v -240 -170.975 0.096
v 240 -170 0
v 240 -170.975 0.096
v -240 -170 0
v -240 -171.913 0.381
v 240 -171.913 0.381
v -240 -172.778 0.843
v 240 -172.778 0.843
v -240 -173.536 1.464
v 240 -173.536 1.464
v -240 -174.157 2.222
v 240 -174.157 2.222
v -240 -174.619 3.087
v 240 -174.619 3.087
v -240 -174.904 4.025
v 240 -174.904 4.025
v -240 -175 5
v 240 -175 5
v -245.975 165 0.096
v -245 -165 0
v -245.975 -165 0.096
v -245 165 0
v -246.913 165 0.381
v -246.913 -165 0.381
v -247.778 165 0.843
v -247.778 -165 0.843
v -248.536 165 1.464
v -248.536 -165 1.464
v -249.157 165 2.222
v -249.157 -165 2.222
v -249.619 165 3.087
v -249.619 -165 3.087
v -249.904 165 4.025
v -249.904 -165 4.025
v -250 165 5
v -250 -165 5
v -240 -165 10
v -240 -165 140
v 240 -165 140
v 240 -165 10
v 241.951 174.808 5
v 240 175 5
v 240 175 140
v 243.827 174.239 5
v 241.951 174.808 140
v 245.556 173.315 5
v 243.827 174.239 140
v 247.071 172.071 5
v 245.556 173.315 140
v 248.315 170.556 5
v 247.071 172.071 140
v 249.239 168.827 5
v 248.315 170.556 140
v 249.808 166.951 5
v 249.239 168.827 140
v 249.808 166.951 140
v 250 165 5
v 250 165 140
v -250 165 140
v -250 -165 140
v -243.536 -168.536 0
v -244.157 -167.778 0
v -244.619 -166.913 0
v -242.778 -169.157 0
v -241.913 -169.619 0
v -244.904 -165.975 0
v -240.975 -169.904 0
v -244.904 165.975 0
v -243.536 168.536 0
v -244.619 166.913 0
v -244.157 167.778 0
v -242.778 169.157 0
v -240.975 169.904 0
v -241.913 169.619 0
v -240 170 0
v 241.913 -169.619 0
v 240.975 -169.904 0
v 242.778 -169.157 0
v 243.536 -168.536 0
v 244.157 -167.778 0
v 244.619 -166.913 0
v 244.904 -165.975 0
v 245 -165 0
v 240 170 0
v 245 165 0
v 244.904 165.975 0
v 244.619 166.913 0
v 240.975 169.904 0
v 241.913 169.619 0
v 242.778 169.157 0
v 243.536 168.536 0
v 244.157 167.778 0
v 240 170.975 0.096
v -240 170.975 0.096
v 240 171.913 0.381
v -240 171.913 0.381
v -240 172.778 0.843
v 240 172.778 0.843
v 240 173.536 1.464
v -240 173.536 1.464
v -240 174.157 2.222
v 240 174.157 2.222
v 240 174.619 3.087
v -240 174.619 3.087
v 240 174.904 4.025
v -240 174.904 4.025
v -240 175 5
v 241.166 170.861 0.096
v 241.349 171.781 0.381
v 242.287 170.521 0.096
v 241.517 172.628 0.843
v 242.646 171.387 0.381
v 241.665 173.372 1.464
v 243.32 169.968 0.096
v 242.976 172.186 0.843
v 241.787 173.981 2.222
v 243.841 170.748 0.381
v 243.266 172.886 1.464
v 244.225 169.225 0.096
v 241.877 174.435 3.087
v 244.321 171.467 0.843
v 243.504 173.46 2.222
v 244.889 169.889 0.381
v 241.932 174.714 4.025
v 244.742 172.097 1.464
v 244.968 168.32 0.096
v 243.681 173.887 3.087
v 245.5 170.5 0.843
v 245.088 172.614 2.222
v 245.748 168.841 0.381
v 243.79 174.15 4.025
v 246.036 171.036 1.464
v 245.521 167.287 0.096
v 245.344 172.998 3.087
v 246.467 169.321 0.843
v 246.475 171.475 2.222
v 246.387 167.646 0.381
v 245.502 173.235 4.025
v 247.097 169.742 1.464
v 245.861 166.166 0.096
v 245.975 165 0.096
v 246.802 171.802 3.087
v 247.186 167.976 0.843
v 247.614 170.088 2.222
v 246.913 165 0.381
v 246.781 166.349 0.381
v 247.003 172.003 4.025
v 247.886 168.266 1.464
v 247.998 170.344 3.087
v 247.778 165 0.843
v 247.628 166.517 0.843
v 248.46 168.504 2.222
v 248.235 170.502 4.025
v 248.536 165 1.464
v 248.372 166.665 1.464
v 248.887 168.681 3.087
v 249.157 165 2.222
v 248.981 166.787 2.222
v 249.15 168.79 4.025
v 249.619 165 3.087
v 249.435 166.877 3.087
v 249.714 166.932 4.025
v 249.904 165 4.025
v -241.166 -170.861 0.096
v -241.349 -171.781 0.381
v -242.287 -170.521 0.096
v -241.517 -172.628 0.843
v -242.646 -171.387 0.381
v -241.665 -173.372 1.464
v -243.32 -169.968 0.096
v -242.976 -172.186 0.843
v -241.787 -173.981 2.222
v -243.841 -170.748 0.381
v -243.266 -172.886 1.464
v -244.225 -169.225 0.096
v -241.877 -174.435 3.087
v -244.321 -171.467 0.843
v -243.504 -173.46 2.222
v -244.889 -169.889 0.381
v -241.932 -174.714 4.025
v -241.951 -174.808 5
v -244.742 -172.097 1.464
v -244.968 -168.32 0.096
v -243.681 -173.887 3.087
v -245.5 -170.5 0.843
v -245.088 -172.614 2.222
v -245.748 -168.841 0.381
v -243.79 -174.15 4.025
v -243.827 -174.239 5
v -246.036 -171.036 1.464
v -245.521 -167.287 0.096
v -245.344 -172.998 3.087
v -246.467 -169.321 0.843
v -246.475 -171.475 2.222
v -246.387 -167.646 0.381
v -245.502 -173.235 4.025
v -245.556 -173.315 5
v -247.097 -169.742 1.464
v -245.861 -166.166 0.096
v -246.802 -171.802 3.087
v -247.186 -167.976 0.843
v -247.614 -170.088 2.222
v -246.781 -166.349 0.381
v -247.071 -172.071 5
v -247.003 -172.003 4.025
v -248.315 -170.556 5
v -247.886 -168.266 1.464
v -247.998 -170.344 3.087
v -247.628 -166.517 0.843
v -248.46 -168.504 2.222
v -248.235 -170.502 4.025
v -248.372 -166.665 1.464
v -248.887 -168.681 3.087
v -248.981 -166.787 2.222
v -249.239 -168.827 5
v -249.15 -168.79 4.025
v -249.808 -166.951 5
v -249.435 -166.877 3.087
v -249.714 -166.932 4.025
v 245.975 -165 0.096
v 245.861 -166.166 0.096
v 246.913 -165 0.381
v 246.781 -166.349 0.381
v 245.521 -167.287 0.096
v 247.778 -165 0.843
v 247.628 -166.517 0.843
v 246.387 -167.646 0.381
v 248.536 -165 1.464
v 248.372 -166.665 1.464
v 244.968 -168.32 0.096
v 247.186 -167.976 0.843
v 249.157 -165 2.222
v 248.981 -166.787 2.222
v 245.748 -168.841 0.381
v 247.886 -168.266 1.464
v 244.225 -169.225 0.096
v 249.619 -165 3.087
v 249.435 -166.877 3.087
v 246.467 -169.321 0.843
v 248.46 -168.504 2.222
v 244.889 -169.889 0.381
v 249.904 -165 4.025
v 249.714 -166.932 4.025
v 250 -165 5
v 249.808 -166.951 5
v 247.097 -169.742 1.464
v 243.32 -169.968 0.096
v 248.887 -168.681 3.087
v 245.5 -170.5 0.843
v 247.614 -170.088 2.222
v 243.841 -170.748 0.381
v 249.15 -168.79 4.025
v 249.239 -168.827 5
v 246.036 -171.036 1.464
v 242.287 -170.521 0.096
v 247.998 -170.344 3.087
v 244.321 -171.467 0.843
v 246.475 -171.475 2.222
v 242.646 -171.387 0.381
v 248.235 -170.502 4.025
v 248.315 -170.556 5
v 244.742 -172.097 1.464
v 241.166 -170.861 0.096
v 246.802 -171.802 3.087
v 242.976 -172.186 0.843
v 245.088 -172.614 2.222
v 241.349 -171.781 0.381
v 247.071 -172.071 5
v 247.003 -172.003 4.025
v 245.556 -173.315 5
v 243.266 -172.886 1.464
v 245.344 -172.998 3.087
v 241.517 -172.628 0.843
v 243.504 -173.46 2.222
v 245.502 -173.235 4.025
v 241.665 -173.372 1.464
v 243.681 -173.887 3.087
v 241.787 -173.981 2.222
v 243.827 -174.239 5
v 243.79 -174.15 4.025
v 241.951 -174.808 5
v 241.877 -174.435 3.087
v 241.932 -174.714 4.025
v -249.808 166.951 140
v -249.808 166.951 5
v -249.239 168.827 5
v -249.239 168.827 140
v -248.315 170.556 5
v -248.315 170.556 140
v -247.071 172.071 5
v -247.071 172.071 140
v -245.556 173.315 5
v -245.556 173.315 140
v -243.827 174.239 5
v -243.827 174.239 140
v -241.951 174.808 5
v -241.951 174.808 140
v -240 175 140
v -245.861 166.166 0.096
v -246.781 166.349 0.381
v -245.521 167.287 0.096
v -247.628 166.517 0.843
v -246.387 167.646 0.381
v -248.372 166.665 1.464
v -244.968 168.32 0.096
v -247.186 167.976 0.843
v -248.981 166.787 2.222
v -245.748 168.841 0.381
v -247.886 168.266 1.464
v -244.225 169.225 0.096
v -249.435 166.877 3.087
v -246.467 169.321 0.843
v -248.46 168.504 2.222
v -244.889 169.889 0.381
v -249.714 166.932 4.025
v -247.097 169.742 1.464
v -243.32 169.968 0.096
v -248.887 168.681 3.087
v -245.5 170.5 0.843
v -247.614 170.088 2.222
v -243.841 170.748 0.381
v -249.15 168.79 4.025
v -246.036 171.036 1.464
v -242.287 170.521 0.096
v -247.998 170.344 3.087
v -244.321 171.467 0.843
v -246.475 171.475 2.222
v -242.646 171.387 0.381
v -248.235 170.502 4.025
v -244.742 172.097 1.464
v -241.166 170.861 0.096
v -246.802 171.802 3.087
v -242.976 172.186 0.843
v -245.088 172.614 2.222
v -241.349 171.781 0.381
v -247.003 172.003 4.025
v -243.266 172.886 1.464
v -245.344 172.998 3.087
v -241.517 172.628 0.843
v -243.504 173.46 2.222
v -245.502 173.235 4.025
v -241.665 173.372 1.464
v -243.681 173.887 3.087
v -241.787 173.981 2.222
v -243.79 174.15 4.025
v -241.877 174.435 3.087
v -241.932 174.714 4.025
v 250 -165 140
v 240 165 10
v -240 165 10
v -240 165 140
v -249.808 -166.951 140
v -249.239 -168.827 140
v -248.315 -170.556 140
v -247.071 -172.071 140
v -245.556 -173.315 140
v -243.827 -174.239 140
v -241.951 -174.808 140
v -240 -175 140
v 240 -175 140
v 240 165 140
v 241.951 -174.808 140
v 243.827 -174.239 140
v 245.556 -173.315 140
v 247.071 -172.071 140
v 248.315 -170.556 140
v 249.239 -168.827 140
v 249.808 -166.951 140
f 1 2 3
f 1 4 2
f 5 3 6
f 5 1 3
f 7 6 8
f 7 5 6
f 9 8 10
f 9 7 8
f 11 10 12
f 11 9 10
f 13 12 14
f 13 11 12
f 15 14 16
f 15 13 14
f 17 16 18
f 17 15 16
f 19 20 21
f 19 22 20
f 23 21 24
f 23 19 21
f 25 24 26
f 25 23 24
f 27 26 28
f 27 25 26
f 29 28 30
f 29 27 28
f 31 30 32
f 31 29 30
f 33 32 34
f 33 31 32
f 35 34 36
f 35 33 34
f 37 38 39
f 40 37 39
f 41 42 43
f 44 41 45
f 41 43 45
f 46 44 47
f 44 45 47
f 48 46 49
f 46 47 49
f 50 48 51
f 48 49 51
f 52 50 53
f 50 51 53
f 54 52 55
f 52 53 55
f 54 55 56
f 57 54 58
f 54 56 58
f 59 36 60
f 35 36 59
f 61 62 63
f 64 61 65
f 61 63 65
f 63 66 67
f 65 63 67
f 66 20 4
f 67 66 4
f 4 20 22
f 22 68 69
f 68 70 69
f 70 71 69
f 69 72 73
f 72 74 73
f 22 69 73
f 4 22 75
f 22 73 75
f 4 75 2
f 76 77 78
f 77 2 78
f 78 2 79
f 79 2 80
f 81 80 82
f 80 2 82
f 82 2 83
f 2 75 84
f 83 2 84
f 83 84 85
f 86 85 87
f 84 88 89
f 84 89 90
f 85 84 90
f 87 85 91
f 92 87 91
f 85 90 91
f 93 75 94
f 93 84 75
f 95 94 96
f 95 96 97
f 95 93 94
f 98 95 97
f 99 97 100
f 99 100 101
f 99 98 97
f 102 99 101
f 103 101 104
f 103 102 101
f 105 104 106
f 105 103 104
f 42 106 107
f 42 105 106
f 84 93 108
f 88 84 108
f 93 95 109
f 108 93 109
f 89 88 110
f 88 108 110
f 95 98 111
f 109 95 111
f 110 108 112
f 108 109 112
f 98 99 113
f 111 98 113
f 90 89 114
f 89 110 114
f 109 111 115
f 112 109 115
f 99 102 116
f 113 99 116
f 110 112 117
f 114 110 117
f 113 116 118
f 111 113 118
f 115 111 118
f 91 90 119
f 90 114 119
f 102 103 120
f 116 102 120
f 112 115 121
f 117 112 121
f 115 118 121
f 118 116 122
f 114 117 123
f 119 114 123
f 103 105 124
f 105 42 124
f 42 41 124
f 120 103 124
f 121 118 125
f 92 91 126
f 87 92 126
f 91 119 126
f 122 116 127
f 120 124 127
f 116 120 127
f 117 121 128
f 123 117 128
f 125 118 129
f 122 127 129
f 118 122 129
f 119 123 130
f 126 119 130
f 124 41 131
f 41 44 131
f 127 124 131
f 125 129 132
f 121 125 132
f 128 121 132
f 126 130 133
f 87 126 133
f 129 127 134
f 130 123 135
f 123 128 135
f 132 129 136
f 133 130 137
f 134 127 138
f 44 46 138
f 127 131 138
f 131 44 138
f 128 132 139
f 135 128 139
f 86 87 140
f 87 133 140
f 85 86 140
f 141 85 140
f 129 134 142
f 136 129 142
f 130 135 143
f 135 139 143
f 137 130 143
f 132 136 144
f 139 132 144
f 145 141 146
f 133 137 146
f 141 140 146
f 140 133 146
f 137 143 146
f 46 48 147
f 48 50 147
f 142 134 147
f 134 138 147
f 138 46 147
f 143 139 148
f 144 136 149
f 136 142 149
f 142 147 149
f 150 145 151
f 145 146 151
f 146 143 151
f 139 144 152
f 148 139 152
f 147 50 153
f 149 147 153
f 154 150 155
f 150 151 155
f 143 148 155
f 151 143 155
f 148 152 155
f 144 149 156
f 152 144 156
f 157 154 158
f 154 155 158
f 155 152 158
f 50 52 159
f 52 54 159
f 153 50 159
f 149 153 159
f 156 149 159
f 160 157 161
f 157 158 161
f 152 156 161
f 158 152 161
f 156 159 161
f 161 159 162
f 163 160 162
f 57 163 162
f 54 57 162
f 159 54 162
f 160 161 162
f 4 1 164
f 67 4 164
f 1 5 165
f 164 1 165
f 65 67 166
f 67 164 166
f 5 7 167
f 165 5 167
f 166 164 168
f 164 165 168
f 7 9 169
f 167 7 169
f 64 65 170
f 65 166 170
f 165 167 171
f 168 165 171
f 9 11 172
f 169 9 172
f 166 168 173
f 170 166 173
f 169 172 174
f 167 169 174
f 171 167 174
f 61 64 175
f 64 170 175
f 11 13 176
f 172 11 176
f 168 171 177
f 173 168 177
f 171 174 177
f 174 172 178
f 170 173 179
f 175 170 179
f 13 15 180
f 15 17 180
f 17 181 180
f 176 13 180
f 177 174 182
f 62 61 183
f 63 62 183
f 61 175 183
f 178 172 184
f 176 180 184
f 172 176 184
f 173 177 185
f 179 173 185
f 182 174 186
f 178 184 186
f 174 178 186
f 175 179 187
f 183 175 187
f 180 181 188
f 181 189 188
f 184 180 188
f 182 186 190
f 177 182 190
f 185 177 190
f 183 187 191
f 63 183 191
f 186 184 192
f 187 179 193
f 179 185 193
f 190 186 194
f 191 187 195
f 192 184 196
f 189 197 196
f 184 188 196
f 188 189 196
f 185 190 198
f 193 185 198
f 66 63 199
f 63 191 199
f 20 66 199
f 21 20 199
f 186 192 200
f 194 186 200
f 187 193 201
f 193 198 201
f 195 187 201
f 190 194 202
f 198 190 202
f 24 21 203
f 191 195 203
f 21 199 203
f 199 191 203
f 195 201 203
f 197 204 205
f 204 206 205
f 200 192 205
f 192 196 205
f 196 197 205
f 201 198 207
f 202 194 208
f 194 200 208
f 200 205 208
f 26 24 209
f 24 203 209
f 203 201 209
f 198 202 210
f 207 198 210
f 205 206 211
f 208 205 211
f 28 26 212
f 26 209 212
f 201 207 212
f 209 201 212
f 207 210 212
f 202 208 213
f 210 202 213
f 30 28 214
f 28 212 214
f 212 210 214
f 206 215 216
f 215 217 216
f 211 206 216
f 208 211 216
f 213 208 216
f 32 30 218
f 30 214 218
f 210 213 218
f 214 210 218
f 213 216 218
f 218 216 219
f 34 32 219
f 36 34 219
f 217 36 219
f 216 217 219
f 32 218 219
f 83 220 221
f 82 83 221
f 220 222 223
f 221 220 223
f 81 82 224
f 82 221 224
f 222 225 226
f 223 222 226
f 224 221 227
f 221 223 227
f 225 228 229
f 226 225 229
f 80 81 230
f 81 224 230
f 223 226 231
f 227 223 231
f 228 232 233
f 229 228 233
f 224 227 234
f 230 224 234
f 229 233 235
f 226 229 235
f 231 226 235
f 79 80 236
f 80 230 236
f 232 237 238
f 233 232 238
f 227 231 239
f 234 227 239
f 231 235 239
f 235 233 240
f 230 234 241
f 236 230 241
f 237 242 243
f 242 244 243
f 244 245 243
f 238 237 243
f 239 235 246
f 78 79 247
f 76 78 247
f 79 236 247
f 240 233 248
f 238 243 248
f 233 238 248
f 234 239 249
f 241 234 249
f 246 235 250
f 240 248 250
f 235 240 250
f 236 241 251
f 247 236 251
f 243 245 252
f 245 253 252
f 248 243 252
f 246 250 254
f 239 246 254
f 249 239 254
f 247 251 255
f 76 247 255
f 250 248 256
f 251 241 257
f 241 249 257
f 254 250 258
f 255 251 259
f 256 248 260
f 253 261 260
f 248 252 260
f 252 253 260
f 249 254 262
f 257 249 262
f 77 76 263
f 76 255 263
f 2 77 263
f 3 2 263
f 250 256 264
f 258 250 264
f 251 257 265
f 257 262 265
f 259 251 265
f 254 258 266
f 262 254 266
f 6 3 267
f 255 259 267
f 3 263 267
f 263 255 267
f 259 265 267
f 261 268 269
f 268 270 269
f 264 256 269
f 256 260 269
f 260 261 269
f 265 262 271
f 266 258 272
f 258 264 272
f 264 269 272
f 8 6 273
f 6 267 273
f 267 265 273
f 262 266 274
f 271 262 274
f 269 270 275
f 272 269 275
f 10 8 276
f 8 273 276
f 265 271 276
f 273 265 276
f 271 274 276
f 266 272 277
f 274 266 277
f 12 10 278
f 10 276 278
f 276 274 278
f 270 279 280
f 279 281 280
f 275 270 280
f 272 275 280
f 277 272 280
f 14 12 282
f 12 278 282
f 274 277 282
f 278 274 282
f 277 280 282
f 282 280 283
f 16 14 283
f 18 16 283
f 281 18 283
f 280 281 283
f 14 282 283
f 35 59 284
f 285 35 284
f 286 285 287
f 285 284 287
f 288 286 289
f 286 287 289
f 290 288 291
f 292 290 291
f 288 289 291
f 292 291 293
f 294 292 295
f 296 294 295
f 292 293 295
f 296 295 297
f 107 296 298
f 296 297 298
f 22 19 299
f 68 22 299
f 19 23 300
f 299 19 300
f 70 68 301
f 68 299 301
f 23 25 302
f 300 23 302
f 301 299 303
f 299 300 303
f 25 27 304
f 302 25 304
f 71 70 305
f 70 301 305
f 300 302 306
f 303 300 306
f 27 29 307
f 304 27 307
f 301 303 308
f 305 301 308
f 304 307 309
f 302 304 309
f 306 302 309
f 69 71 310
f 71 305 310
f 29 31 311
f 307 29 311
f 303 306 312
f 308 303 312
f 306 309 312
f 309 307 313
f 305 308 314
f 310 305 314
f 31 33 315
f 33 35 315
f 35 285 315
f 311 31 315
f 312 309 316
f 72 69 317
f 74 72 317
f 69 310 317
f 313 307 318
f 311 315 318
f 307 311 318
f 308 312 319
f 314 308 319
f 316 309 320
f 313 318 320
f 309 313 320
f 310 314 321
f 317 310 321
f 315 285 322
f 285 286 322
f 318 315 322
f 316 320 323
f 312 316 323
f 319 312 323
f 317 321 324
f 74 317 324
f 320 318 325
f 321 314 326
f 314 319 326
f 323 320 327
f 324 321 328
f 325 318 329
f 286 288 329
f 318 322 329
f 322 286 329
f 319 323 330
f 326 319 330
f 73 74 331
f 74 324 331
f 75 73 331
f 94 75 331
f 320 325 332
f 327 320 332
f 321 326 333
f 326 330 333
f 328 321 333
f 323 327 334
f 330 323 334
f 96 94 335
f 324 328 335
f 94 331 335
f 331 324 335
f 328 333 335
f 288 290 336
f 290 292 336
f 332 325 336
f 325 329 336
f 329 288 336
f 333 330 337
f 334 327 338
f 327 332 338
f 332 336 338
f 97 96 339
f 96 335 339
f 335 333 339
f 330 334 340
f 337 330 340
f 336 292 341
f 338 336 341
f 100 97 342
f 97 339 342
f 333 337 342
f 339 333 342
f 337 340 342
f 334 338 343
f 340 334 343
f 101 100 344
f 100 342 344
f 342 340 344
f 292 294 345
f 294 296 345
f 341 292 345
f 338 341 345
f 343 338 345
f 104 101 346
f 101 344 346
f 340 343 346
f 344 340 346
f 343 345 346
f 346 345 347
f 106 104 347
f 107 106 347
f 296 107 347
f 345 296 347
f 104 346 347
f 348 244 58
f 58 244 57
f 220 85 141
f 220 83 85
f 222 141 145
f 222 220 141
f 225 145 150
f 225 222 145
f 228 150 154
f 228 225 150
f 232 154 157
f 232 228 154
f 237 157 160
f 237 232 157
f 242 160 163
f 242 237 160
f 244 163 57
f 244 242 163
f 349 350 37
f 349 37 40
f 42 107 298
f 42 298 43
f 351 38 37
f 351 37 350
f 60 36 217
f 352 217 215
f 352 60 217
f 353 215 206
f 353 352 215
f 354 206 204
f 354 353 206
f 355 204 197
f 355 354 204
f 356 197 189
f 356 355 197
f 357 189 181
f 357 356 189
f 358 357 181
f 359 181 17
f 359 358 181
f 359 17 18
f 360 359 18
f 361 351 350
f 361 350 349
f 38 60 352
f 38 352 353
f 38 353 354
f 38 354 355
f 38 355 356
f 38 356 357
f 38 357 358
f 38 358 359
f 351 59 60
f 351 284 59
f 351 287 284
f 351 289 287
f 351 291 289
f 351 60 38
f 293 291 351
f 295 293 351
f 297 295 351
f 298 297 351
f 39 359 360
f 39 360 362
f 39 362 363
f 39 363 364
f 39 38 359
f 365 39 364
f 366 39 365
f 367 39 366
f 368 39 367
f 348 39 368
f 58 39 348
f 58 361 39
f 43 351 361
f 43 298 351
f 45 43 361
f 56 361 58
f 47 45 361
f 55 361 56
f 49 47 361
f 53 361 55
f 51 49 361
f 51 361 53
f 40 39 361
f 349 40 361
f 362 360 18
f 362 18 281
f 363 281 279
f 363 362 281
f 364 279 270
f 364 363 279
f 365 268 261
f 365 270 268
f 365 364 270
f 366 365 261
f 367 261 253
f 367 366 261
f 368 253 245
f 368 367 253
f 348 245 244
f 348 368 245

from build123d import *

# Parameters (mm, degrees)
SKETCH1_W           = 500
SKETCH1_H           = 350
BOSS_EXTRUDE2_DEPTH = 140
SKETCH4_W           = 480
SKETCH4_H           = 330
CUT_EXTRUDE3_DEPTH  = 130
FILLET1_R           = 10
FILLET3_R           = 5


with BuildPart() as part:
    # Sketch1 → Boss-Extrude2 (new body)
    with BuildSketch(Plane.XY):
        Rectangle(SKETCH1_W, SKETCH1_H)
    extrude(amount=BOSS_EXTRUDE2_DEPTH)

    # Sketch4 → Cut-Extrude3 (cut)
    with BuildSketch(Plane.XY.offset(140)):
        Rectangle(SKETCH4_W, SKETCH4_H)
    extrude(amount=-CUT_EXTRUDE3_DEPTH, mode=Mode.SUBTRACT)

    # Fillet1
    fillet1_edges = [part.edges().sort_by_distance(p)[0] for p in [
        (250, -175, 70),
        (-250, -175, 70),
        (-250, 175, 70),
        (250, 175, 70),
    ]]
    fillet(fillet1_edges, radius=FILLET1_R)

    # Fillet3
    fillet3_edges = [part.edges().sort_by_distance(p)[0] for p in [
        (0, 175, 0),
        (250, 0, 0),
        (0, -175, 0),
        (-250, 0, 0),
        (-247.071067812, -172.071067812, 0),
        (-247.071067812, 172.071067812, 0),
        (247.071067812, -172.071067812, 0),
        (247.071067812, 172.071067812, 0),
    ]]
    fillet(fillet3_edges, radius=FILLET3_R)


solid = part.part
